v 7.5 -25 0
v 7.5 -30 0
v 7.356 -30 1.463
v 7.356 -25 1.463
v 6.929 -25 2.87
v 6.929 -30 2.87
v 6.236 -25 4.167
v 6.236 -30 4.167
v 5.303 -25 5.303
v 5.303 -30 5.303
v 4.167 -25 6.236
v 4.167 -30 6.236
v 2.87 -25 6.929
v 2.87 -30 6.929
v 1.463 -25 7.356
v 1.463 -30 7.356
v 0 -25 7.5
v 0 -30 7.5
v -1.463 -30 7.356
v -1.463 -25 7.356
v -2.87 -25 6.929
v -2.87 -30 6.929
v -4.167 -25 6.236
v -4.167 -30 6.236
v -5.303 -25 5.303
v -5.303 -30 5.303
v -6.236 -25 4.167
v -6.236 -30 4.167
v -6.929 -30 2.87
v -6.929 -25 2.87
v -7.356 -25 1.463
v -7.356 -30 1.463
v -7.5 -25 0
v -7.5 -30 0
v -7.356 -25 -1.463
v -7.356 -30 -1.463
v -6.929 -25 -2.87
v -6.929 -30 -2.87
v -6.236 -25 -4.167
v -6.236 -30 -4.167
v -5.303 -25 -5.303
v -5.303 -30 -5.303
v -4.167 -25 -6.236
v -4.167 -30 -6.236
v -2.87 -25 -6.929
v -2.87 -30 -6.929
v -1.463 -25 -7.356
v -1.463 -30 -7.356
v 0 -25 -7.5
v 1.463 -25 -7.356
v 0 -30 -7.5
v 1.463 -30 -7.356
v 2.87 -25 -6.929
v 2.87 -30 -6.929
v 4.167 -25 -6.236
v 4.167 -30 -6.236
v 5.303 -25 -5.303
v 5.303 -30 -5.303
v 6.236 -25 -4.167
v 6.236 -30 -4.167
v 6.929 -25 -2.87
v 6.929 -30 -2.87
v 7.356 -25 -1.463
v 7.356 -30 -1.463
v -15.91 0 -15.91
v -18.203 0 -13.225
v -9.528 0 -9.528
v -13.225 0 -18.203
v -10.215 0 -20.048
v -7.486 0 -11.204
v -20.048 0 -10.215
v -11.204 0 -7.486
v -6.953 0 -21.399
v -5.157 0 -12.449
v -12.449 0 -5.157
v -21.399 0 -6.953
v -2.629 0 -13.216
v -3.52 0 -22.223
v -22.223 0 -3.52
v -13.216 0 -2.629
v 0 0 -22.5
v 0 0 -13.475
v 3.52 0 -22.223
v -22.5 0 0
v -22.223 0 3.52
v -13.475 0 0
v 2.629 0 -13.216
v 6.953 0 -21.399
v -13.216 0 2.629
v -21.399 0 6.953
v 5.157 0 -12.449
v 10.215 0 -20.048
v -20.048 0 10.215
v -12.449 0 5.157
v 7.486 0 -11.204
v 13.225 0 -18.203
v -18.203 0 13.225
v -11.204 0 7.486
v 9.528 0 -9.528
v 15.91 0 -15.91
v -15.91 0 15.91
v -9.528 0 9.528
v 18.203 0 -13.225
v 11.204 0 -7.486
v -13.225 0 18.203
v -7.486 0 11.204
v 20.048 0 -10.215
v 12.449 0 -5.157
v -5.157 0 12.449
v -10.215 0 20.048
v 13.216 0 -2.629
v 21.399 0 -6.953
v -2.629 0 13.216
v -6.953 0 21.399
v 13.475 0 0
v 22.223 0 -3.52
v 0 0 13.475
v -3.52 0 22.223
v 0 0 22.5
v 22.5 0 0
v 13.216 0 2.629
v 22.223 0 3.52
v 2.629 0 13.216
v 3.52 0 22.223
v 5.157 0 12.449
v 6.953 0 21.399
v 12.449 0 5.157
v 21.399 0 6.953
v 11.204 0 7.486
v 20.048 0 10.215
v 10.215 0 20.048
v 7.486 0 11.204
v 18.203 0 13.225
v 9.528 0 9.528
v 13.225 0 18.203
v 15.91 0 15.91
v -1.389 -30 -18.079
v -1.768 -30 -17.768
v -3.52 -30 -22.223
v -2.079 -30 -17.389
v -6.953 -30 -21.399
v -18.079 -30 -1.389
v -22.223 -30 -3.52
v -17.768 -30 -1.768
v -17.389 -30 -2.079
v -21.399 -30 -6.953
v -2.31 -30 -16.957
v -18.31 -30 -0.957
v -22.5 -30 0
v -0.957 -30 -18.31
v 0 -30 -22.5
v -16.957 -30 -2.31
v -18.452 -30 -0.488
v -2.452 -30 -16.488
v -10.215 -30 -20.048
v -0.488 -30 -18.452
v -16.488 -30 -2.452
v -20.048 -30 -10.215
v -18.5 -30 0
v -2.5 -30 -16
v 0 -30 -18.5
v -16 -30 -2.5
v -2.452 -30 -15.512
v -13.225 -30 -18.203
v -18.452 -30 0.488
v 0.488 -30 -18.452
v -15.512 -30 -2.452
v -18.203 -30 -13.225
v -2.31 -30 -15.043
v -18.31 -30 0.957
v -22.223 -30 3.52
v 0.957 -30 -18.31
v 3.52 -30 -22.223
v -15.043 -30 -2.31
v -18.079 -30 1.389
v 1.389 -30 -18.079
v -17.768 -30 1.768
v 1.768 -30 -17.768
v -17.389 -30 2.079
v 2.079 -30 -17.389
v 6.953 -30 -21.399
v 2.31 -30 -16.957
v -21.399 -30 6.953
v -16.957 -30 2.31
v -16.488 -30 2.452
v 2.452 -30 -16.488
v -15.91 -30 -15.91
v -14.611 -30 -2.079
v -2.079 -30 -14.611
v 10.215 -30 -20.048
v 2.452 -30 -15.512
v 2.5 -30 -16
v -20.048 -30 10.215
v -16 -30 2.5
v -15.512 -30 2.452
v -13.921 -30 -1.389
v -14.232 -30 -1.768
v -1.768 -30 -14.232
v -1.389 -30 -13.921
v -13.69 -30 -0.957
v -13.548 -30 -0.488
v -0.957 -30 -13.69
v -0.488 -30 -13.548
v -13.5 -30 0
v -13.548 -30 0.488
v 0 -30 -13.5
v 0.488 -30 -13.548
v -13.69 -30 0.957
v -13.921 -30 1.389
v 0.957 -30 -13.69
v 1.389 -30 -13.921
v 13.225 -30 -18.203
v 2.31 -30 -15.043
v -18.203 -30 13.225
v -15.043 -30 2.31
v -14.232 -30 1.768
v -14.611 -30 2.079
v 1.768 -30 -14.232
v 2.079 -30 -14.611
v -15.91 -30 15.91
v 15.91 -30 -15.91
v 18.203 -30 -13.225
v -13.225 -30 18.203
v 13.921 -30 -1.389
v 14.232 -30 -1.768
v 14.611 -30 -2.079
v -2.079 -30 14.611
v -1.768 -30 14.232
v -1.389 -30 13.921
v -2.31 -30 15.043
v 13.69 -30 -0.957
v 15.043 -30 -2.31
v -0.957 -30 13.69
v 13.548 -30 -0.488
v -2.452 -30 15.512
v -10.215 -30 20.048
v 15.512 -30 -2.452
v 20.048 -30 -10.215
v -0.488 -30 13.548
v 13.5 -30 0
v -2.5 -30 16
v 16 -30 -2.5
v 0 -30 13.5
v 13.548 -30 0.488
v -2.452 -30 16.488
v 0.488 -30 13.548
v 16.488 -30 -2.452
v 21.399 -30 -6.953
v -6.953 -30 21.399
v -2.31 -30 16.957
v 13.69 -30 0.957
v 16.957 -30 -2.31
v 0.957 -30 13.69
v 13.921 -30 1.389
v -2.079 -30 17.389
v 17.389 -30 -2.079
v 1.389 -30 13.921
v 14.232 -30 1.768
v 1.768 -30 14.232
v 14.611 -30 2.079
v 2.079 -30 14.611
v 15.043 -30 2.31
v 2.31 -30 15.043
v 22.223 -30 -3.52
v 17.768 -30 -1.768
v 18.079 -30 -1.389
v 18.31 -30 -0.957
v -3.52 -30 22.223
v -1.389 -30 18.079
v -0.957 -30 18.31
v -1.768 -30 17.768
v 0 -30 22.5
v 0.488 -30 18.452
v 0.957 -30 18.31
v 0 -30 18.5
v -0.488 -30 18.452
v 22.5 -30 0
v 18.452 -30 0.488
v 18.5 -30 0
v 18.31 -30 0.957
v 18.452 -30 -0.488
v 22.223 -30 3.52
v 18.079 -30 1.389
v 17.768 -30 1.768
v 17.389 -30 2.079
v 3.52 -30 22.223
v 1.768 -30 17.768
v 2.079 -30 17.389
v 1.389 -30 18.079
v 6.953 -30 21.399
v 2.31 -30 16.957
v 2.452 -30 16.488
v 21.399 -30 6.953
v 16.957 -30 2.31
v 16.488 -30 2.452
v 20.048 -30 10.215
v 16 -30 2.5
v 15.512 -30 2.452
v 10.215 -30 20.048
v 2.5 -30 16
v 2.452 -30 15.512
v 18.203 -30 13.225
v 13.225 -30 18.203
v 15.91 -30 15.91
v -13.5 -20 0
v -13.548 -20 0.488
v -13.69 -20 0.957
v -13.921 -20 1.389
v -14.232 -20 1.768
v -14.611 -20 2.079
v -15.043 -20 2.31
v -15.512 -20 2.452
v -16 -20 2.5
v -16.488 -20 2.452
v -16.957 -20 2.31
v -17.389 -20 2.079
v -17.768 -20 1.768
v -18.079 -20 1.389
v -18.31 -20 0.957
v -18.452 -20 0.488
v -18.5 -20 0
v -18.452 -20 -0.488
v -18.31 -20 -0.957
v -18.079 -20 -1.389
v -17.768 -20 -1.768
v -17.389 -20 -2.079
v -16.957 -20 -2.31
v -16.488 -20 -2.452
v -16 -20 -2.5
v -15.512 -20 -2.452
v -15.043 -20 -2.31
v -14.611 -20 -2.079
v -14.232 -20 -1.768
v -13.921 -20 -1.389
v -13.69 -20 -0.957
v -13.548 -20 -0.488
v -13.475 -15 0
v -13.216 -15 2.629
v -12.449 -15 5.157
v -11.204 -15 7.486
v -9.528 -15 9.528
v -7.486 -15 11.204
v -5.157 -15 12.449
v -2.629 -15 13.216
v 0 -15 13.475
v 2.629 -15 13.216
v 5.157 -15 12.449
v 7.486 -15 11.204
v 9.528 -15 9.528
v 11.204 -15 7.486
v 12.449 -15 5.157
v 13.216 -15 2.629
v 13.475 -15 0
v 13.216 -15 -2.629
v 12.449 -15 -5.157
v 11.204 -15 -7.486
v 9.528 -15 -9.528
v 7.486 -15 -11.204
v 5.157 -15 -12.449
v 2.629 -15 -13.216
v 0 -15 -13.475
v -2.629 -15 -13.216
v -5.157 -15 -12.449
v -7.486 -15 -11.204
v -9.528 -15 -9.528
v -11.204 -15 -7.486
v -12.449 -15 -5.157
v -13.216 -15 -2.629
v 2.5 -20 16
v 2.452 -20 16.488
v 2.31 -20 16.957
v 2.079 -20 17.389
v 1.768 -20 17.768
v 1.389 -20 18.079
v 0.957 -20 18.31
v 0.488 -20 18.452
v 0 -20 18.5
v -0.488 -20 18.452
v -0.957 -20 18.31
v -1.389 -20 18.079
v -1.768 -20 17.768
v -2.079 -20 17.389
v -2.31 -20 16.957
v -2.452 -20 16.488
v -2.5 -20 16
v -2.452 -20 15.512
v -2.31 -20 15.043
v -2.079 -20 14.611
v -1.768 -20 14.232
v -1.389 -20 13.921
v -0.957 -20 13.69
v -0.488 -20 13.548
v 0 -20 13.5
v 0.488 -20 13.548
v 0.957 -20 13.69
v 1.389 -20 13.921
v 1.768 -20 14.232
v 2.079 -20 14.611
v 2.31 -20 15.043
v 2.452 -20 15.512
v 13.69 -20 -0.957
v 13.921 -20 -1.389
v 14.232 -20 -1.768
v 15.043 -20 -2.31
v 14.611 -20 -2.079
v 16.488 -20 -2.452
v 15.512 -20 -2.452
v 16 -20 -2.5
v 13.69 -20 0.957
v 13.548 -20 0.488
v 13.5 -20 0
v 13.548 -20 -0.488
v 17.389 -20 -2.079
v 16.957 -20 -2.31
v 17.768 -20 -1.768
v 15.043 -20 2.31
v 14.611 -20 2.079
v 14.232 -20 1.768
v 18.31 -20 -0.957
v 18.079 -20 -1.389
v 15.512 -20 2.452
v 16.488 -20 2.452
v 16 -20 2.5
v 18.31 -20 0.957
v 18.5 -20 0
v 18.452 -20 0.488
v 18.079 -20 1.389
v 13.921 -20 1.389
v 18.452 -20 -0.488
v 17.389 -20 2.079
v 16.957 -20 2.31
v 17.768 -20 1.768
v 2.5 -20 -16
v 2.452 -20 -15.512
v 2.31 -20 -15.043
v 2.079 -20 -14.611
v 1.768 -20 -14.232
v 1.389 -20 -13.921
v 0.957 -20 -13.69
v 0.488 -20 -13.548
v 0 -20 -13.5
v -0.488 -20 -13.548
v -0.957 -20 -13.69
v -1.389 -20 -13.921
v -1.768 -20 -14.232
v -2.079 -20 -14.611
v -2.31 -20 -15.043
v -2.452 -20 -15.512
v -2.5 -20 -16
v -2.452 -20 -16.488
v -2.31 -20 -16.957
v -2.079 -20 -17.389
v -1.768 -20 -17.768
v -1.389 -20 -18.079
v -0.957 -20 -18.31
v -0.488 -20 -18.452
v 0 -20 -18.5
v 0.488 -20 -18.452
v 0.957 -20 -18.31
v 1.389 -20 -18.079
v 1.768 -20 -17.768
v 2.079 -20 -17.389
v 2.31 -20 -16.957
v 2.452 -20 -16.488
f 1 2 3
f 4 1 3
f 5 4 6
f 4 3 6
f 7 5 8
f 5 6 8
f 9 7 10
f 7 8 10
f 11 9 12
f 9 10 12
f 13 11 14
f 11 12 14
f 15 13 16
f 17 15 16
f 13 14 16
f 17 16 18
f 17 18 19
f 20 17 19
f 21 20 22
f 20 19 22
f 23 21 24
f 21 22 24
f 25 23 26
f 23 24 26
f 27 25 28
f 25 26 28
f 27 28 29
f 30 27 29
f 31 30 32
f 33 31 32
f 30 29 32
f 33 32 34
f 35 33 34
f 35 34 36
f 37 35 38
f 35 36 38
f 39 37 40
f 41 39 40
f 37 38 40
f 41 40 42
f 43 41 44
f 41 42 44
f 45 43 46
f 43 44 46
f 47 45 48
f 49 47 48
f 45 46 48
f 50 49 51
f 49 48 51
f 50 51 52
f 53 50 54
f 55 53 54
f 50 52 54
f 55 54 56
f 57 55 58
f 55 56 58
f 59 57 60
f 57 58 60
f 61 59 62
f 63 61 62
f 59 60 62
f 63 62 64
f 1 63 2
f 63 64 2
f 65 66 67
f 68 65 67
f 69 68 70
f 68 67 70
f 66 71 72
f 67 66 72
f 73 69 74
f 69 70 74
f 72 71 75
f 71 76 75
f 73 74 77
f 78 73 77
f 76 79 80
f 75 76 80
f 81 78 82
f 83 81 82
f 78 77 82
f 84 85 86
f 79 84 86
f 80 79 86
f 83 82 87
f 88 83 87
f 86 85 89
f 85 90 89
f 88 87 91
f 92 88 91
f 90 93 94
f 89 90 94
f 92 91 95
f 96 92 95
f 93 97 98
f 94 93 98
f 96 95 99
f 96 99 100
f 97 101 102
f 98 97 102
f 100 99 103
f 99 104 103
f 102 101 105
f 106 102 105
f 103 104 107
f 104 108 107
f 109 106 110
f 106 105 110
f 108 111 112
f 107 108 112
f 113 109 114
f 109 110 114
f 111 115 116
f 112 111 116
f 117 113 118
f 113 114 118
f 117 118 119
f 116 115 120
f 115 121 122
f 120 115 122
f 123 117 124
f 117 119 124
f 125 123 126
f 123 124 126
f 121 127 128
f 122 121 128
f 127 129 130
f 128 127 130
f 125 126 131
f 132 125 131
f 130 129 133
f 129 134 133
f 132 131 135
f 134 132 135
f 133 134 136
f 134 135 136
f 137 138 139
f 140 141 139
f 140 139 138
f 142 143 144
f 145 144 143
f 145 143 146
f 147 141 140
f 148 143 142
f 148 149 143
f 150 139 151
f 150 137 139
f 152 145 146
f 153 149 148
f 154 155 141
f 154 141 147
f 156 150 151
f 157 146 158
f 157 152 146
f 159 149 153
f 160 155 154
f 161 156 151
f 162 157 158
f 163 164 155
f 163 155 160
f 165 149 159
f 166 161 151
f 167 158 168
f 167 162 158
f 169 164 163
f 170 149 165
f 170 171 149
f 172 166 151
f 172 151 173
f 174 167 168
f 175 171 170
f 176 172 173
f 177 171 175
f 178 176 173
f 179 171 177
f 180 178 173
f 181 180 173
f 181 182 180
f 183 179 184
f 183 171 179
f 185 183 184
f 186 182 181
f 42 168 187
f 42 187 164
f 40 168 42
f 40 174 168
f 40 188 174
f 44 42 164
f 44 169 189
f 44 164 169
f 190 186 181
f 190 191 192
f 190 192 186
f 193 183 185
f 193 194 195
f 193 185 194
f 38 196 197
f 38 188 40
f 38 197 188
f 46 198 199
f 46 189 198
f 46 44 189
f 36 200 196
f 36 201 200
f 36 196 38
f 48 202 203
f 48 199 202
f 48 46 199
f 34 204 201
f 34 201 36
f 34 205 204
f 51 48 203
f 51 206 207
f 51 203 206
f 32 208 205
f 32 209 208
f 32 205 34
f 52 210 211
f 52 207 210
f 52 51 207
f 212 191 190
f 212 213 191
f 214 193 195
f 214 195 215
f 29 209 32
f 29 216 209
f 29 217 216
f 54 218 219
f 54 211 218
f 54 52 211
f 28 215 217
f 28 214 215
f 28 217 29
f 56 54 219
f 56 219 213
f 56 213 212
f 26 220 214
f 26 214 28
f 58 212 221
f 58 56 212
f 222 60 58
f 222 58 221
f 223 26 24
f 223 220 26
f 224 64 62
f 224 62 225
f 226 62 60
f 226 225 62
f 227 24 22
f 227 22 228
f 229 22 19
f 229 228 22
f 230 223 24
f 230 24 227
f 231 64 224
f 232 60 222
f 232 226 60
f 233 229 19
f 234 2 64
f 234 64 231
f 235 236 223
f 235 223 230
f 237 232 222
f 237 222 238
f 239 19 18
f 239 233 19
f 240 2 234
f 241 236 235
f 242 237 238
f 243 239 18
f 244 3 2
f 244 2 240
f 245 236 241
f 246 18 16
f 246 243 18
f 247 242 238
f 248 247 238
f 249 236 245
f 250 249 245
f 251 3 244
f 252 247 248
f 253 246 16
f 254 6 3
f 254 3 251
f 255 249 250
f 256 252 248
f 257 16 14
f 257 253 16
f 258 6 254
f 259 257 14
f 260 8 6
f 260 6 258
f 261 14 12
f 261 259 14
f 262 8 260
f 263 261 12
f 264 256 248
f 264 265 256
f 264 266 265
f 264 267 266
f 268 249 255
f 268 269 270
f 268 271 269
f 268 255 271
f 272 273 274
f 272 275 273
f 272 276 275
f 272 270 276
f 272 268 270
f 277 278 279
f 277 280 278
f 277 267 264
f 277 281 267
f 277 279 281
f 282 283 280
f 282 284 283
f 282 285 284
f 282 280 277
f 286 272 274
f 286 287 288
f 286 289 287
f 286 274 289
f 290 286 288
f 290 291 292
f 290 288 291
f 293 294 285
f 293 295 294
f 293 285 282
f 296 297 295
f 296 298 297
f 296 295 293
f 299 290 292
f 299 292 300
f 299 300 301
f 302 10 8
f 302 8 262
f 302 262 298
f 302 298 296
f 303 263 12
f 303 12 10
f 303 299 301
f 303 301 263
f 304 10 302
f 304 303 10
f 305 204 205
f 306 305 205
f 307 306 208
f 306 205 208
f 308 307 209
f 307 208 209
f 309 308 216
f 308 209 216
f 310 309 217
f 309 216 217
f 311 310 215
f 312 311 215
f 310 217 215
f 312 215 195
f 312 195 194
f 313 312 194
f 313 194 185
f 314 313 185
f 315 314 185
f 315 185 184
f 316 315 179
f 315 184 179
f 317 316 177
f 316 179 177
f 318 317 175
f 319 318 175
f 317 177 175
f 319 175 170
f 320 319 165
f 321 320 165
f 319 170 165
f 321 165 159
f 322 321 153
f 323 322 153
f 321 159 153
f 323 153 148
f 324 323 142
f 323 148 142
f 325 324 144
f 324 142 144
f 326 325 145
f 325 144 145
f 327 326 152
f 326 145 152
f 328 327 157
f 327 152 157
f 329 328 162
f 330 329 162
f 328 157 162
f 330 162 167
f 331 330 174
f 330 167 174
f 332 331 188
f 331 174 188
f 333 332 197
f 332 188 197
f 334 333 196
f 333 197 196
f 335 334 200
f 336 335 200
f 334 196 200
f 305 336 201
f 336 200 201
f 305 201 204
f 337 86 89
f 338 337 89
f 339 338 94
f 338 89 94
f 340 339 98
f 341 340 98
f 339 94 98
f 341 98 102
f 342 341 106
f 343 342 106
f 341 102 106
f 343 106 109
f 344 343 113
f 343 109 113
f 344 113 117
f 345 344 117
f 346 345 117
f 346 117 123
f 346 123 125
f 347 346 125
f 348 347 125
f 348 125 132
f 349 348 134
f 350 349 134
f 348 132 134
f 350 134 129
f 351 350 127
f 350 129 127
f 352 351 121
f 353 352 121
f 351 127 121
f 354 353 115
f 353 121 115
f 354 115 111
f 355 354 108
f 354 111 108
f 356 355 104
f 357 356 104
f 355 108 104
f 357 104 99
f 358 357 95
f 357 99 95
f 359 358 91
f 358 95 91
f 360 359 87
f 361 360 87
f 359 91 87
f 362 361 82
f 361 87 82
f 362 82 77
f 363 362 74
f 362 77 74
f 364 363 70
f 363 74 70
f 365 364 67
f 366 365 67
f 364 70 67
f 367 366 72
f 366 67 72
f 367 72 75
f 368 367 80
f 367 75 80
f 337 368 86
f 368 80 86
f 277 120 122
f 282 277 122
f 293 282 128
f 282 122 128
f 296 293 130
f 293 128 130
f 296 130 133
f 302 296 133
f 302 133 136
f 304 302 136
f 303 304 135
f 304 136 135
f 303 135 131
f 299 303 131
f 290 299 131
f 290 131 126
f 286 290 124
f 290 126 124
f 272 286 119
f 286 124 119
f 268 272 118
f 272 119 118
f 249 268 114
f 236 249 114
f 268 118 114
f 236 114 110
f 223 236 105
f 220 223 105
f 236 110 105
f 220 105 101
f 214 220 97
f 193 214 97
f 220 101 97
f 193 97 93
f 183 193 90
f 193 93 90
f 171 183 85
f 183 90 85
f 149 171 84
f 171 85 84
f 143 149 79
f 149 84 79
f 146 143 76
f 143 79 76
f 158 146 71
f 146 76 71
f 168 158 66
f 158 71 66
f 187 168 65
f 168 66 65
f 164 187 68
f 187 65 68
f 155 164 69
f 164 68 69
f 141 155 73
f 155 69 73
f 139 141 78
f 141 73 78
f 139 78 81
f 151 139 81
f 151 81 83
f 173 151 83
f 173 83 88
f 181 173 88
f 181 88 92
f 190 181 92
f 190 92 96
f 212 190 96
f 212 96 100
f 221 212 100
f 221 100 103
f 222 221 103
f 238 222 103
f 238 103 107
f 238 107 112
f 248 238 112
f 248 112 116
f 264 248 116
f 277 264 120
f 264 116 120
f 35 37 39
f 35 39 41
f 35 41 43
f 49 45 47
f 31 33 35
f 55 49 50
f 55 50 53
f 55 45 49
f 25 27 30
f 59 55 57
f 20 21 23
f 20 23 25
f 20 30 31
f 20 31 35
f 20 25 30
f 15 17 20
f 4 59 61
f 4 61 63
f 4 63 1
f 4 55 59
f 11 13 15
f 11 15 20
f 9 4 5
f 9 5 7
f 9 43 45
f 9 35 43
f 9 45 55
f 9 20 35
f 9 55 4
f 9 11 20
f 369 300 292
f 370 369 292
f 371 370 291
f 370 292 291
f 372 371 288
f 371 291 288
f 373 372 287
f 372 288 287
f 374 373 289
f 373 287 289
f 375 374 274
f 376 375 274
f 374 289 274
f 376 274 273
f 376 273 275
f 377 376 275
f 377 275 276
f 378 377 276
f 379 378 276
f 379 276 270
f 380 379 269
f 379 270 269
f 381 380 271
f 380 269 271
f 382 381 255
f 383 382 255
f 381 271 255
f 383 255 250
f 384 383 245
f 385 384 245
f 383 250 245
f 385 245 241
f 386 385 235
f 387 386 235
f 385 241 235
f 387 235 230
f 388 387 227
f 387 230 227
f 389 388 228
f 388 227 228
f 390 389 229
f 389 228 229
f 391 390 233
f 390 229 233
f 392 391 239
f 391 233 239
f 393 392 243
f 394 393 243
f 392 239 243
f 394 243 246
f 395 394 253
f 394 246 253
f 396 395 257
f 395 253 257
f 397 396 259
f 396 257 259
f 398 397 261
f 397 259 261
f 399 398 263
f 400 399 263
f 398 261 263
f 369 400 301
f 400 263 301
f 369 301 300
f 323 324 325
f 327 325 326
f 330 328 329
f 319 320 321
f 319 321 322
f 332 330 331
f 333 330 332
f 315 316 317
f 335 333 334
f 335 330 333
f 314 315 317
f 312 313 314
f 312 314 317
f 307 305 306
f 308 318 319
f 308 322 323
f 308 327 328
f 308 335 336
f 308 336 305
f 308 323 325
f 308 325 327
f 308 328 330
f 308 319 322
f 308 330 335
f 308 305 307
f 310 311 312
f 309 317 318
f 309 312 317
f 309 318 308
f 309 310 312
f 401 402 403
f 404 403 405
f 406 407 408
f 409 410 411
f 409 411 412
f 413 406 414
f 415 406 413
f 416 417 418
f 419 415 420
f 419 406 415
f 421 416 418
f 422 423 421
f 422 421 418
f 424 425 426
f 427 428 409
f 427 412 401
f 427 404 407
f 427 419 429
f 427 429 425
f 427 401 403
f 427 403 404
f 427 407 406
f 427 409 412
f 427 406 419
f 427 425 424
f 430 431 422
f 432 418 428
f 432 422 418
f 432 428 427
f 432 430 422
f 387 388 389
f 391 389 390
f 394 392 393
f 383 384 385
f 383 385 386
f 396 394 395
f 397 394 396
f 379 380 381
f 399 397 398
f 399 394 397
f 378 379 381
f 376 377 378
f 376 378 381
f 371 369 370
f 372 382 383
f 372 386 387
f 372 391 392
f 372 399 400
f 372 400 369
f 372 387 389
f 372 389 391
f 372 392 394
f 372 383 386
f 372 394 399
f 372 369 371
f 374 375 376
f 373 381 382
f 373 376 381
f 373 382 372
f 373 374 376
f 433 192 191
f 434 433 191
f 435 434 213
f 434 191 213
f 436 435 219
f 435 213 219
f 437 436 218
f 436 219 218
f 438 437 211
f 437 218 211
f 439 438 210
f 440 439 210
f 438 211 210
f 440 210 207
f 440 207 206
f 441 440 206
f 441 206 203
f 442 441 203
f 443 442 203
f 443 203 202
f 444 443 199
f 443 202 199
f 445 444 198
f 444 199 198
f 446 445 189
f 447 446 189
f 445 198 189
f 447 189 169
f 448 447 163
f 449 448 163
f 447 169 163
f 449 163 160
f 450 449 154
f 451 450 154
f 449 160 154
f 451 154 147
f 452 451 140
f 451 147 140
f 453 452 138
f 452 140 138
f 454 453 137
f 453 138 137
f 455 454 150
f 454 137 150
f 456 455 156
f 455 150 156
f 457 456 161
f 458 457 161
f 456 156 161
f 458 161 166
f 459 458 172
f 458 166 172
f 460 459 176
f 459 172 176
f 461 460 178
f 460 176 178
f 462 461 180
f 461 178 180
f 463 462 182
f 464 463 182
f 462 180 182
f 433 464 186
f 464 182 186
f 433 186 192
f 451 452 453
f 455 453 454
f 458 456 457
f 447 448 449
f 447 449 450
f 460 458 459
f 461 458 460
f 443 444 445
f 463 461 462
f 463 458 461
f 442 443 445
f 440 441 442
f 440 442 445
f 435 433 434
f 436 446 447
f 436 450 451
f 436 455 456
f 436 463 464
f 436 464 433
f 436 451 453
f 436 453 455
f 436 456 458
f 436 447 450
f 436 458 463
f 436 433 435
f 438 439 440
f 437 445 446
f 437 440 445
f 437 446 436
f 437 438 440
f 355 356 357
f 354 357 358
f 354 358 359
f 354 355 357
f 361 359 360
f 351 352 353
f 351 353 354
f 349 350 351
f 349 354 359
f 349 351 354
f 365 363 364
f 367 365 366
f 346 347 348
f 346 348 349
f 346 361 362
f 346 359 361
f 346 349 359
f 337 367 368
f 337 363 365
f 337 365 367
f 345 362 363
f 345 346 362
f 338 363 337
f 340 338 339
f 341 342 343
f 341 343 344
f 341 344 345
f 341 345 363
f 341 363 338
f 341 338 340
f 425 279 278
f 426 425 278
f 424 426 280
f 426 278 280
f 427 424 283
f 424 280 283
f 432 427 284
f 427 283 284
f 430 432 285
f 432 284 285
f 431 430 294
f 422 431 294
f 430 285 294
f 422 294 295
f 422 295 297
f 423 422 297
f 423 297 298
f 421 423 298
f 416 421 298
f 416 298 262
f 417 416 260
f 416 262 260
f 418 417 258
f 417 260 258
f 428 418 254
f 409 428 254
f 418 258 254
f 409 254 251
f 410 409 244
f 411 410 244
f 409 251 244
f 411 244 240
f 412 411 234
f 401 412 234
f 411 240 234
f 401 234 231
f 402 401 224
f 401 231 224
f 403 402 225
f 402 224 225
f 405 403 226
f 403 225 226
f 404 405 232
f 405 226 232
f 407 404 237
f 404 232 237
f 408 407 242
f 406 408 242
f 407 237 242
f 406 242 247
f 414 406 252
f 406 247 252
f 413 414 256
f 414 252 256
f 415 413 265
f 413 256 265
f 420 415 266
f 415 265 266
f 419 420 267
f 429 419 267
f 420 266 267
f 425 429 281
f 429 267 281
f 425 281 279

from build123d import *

# Parameters (mm, degrees)
F0_R     = 22.5
F1_DEPTH = 30
F2_R     = 7.5
F3_DEPTH = 5
F4_R     = 2.5
F5_DEPTH = 10
F6_R     = 13.475
F7_DEPTH = 15


with BuildPart() as f1:
    # F0 (on Front) → F1 (new body)
    with BuildSketch(Plane.XZ):
        Circle(F0_R)
    extrude(amount=F1_DEPTH)

    # F2 (on face) → F3 (cut)
    with BuildSketch(Plane.XZ.offset(30)):
        Circle(F2_R)
    extrude(amount=-F3_DEPTH, mode=Mode.SUBTRACT)

    # F4 (on face) → F5 (cut)
    with BuildSketch(Plane.XZ.offset(30)):
        with Locations((-16, 0)):
            Circle(F4_R)
        with Locations((0, 16)):
            Circle(F4_R)
        with Locations((16, 0)):
            Circle(F4_R)
        with Locations((0, -16)):
            Circle(F4_R)
    extrude(amount=-F5_DEPTH, mode=Mode.SUBTRACT)

    # F6 (on face) → F7 (cut)
    with BuildSketch(Plane(origin=(0, 0, 0), x_dir=(-1, 0, 0), z_dir=(0, 1, 0))):
        Circle(F6_R)
    extrude(amount=-F7_DEPTH, mode=Mode.SUBTRACT)


solid = f1.part
